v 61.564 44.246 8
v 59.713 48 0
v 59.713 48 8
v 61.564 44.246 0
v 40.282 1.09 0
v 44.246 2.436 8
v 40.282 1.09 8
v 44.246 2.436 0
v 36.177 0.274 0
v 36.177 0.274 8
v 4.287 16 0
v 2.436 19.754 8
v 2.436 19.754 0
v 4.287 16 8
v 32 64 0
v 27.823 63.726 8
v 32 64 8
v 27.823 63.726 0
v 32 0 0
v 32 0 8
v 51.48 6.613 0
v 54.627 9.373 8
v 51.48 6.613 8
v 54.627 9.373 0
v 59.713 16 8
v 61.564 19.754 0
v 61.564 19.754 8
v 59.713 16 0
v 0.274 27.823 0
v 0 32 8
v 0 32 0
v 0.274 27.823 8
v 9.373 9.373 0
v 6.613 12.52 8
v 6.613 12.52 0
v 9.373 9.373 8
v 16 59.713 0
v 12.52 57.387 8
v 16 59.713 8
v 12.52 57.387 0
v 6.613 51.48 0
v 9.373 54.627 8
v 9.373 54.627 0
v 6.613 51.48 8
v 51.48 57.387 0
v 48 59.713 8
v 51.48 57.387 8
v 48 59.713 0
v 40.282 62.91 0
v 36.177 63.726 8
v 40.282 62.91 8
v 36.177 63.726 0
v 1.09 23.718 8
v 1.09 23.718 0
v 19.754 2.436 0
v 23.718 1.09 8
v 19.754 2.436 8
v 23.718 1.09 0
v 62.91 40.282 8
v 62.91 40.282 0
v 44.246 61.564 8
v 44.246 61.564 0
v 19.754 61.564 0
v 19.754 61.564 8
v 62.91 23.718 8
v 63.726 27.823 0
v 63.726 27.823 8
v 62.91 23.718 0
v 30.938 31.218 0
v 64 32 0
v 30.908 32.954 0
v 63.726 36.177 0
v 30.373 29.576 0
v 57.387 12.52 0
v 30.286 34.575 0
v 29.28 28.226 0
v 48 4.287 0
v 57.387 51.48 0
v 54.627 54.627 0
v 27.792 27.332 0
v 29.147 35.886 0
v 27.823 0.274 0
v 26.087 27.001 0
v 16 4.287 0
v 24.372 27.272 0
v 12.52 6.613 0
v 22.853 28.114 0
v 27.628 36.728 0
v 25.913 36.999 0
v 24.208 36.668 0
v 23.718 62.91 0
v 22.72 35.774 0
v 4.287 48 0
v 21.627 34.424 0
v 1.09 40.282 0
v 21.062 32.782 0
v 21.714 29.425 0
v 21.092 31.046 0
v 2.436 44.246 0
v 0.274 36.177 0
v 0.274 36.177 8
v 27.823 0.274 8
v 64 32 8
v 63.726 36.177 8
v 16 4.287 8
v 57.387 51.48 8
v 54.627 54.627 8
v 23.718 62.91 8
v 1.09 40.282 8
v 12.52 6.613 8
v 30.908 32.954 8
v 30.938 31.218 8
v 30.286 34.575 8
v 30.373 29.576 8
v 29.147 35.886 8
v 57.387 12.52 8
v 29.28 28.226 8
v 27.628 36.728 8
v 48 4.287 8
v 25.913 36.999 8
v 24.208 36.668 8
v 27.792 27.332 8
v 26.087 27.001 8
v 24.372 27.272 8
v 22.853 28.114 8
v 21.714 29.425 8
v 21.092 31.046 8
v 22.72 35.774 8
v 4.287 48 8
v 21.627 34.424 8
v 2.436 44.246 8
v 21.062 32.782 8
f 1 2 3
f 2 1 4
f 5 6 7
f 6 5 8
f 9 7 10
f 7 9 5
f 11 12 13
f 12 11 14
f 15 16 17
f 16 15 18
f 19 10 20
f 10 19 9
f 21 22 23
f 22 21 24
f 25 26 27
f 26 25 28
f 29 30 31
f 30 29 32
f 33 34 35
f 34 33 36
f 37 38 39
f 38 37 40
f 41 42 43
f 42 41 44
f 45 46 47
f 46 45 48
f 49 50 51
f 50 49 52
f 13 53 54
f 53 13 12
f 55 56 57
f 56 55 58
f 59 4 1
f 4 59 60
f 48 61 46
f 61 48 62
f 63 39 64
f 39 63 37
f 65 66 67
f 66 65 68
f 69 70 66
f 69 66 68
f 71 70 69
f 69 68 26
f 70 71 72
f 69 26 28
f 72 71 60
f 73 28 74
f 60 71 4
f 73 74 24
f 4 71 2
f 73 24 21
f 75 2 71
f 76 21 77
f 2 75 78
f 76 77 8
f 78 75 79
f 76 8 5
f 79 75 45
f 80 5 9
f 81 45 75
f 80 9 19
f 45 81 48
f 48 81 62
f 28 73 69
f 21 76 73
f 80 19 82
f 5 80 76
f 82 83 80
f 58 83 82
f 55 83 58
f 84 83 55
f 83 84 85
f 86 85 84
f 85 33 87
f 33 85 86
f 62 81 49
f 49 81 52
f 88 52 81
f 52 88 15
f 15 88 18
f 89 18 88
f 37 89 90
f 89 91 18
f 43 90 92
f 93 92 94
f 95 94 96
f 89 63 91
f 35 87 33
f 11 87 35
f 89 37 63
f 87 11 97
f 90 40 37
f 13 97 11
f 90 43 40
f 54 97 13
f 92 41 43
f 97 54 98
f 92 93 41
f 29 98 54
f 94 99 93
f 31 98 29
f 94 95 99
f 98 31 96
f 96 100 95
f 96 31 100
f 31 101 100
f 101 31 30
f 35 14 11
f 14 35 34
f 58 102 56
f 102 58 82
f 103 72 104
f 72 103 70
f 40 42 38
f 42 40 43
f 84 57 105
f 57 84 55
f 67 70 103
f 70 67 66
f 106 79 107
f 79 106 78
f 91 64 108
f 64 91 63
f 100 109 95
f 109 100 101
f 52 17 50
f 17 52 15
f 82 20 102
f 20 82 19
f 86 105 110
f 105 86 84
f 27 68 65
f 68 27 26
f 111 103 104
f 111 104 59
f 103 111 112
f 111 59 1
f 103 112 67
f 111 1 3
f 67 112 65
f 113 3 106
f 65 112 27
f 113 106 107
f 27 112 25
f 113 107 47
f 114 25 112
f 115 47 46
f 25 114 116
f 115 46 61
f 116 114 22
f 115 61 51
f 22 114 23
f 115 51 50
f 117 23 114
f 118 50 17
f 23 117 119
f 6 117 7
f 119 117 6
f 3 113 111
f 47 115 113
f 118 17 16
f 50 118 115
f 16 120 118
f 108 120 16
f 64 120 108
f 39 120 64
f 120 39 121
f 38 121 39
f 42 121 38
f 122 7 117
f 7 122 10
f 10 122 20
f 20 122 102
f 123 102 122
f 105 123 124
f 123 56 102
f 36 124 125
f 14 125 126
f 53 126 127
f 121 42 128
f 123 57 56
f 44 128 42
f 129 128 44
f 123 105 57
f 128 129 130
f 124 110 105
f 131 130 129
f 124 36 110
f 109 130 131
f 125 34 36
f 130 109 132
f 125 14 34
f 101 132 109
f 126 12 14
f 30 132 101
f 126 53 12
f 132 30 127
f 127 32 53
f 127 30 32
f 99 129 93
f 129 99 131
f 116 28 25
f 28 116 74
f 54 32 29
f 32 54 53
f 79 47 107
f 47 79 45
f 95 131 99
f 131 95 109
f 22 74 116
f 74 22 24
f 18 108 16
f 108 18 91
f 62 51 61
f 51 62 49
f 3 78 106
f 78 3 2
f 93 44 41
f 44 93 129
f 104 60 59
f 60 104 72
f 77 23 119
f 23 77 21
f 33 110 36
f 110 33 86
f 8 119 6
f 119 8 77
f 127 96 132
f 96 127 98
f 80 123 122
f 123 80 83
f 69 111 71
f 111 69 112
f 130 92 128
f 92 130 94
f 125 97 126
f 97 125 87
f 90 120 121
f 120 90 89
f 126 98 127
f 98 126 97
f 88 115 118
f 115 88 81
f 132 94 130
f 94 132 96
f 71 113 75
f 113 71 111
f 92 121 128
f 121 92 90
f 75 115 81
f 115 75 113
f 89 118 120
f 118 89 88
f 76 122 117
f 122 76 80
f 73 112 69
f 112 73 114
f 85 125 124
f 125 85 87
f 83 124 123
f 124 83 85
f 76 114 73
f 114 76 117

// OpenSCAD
$fn = 32;

// ----------------------------------------------------------------------
// Cam plate: eccentric cam, base R32
// ----------------------------------------------------------------------

// --- parameters (mm) ---
base_r = 32;              // base circle radius
lobe_h = 12;              // cam lobe rise
bore_r = 5;               // shaft bore radius
plate_t = 8;              // plate thickness, Z (extrusion height)
ecc = 6;                  // disc eccentricity

profile = [[64, 32], [63.726, 36.177], [62.91, 40.282], [61.564, 44.246], [59.713, 48], [57.387, 51.48], [54.627, 54.627], [51.48, 57.387], [48, 59.713], [44.246, 61.564], [40.282, 62.91], [36.177, 63.726], [32, 64], [27.823, 63.726], [23.718, 62.91], [19.754, 61.564], [16, 59.713], [12.52, 57.387], [9.373, 54.627], [6.613, 51.48], [4.287, 48], [2.436, 44.246], [1.09, 40.282], [0.274, 36.177], [0, 32], [0.274, 27.823], [1.09, 23.718], [2.436, 19.754], [4.287, 16], [6.613, 12.52], [9.373, 9.373], [12.52, 6.613], [16, 4.287], [19.754, 2.436], [23.718, 1.09], [27.823, 0.274], [32, 0], [36.177, 0.274], [40.282, 1.09], [44.246, 2.436], [48, 4.287], [51.48, 6.613], [54.627, 9.373], [57.387, 12.52], [59.713, 16], [61.564, 19.754], [62.91, 23.718], [63.726, 27.823]];  // primary outline, 48 points, counter clockwise
void_1 = [[30.908, 32.954], [30.286, 34.575], [29.147, 35.886], [27.628, 36.728], [25.913, 36.999], [24.208, 36.668], [22.72, 35.774], [21.627, 34.424], [21.062, 32.782], [21.092, 31.046], [21.714, 29.425], [22.853, 28.114], [24.372, 27.272], [26.087, 27.001], [27.792, 27.332], [29.28, 28.226], [30.373, 29.576], [30.938, 31.218]];  // shaft bore, 18 points

// --- the one profile operation ---
difference() {
  linear_extrude(height = plate_t) polygon(points = profile);
  translate([0, 0, -1])
    linear_extrude(height = plate_t + 2) polygon(points = void_1);
}
